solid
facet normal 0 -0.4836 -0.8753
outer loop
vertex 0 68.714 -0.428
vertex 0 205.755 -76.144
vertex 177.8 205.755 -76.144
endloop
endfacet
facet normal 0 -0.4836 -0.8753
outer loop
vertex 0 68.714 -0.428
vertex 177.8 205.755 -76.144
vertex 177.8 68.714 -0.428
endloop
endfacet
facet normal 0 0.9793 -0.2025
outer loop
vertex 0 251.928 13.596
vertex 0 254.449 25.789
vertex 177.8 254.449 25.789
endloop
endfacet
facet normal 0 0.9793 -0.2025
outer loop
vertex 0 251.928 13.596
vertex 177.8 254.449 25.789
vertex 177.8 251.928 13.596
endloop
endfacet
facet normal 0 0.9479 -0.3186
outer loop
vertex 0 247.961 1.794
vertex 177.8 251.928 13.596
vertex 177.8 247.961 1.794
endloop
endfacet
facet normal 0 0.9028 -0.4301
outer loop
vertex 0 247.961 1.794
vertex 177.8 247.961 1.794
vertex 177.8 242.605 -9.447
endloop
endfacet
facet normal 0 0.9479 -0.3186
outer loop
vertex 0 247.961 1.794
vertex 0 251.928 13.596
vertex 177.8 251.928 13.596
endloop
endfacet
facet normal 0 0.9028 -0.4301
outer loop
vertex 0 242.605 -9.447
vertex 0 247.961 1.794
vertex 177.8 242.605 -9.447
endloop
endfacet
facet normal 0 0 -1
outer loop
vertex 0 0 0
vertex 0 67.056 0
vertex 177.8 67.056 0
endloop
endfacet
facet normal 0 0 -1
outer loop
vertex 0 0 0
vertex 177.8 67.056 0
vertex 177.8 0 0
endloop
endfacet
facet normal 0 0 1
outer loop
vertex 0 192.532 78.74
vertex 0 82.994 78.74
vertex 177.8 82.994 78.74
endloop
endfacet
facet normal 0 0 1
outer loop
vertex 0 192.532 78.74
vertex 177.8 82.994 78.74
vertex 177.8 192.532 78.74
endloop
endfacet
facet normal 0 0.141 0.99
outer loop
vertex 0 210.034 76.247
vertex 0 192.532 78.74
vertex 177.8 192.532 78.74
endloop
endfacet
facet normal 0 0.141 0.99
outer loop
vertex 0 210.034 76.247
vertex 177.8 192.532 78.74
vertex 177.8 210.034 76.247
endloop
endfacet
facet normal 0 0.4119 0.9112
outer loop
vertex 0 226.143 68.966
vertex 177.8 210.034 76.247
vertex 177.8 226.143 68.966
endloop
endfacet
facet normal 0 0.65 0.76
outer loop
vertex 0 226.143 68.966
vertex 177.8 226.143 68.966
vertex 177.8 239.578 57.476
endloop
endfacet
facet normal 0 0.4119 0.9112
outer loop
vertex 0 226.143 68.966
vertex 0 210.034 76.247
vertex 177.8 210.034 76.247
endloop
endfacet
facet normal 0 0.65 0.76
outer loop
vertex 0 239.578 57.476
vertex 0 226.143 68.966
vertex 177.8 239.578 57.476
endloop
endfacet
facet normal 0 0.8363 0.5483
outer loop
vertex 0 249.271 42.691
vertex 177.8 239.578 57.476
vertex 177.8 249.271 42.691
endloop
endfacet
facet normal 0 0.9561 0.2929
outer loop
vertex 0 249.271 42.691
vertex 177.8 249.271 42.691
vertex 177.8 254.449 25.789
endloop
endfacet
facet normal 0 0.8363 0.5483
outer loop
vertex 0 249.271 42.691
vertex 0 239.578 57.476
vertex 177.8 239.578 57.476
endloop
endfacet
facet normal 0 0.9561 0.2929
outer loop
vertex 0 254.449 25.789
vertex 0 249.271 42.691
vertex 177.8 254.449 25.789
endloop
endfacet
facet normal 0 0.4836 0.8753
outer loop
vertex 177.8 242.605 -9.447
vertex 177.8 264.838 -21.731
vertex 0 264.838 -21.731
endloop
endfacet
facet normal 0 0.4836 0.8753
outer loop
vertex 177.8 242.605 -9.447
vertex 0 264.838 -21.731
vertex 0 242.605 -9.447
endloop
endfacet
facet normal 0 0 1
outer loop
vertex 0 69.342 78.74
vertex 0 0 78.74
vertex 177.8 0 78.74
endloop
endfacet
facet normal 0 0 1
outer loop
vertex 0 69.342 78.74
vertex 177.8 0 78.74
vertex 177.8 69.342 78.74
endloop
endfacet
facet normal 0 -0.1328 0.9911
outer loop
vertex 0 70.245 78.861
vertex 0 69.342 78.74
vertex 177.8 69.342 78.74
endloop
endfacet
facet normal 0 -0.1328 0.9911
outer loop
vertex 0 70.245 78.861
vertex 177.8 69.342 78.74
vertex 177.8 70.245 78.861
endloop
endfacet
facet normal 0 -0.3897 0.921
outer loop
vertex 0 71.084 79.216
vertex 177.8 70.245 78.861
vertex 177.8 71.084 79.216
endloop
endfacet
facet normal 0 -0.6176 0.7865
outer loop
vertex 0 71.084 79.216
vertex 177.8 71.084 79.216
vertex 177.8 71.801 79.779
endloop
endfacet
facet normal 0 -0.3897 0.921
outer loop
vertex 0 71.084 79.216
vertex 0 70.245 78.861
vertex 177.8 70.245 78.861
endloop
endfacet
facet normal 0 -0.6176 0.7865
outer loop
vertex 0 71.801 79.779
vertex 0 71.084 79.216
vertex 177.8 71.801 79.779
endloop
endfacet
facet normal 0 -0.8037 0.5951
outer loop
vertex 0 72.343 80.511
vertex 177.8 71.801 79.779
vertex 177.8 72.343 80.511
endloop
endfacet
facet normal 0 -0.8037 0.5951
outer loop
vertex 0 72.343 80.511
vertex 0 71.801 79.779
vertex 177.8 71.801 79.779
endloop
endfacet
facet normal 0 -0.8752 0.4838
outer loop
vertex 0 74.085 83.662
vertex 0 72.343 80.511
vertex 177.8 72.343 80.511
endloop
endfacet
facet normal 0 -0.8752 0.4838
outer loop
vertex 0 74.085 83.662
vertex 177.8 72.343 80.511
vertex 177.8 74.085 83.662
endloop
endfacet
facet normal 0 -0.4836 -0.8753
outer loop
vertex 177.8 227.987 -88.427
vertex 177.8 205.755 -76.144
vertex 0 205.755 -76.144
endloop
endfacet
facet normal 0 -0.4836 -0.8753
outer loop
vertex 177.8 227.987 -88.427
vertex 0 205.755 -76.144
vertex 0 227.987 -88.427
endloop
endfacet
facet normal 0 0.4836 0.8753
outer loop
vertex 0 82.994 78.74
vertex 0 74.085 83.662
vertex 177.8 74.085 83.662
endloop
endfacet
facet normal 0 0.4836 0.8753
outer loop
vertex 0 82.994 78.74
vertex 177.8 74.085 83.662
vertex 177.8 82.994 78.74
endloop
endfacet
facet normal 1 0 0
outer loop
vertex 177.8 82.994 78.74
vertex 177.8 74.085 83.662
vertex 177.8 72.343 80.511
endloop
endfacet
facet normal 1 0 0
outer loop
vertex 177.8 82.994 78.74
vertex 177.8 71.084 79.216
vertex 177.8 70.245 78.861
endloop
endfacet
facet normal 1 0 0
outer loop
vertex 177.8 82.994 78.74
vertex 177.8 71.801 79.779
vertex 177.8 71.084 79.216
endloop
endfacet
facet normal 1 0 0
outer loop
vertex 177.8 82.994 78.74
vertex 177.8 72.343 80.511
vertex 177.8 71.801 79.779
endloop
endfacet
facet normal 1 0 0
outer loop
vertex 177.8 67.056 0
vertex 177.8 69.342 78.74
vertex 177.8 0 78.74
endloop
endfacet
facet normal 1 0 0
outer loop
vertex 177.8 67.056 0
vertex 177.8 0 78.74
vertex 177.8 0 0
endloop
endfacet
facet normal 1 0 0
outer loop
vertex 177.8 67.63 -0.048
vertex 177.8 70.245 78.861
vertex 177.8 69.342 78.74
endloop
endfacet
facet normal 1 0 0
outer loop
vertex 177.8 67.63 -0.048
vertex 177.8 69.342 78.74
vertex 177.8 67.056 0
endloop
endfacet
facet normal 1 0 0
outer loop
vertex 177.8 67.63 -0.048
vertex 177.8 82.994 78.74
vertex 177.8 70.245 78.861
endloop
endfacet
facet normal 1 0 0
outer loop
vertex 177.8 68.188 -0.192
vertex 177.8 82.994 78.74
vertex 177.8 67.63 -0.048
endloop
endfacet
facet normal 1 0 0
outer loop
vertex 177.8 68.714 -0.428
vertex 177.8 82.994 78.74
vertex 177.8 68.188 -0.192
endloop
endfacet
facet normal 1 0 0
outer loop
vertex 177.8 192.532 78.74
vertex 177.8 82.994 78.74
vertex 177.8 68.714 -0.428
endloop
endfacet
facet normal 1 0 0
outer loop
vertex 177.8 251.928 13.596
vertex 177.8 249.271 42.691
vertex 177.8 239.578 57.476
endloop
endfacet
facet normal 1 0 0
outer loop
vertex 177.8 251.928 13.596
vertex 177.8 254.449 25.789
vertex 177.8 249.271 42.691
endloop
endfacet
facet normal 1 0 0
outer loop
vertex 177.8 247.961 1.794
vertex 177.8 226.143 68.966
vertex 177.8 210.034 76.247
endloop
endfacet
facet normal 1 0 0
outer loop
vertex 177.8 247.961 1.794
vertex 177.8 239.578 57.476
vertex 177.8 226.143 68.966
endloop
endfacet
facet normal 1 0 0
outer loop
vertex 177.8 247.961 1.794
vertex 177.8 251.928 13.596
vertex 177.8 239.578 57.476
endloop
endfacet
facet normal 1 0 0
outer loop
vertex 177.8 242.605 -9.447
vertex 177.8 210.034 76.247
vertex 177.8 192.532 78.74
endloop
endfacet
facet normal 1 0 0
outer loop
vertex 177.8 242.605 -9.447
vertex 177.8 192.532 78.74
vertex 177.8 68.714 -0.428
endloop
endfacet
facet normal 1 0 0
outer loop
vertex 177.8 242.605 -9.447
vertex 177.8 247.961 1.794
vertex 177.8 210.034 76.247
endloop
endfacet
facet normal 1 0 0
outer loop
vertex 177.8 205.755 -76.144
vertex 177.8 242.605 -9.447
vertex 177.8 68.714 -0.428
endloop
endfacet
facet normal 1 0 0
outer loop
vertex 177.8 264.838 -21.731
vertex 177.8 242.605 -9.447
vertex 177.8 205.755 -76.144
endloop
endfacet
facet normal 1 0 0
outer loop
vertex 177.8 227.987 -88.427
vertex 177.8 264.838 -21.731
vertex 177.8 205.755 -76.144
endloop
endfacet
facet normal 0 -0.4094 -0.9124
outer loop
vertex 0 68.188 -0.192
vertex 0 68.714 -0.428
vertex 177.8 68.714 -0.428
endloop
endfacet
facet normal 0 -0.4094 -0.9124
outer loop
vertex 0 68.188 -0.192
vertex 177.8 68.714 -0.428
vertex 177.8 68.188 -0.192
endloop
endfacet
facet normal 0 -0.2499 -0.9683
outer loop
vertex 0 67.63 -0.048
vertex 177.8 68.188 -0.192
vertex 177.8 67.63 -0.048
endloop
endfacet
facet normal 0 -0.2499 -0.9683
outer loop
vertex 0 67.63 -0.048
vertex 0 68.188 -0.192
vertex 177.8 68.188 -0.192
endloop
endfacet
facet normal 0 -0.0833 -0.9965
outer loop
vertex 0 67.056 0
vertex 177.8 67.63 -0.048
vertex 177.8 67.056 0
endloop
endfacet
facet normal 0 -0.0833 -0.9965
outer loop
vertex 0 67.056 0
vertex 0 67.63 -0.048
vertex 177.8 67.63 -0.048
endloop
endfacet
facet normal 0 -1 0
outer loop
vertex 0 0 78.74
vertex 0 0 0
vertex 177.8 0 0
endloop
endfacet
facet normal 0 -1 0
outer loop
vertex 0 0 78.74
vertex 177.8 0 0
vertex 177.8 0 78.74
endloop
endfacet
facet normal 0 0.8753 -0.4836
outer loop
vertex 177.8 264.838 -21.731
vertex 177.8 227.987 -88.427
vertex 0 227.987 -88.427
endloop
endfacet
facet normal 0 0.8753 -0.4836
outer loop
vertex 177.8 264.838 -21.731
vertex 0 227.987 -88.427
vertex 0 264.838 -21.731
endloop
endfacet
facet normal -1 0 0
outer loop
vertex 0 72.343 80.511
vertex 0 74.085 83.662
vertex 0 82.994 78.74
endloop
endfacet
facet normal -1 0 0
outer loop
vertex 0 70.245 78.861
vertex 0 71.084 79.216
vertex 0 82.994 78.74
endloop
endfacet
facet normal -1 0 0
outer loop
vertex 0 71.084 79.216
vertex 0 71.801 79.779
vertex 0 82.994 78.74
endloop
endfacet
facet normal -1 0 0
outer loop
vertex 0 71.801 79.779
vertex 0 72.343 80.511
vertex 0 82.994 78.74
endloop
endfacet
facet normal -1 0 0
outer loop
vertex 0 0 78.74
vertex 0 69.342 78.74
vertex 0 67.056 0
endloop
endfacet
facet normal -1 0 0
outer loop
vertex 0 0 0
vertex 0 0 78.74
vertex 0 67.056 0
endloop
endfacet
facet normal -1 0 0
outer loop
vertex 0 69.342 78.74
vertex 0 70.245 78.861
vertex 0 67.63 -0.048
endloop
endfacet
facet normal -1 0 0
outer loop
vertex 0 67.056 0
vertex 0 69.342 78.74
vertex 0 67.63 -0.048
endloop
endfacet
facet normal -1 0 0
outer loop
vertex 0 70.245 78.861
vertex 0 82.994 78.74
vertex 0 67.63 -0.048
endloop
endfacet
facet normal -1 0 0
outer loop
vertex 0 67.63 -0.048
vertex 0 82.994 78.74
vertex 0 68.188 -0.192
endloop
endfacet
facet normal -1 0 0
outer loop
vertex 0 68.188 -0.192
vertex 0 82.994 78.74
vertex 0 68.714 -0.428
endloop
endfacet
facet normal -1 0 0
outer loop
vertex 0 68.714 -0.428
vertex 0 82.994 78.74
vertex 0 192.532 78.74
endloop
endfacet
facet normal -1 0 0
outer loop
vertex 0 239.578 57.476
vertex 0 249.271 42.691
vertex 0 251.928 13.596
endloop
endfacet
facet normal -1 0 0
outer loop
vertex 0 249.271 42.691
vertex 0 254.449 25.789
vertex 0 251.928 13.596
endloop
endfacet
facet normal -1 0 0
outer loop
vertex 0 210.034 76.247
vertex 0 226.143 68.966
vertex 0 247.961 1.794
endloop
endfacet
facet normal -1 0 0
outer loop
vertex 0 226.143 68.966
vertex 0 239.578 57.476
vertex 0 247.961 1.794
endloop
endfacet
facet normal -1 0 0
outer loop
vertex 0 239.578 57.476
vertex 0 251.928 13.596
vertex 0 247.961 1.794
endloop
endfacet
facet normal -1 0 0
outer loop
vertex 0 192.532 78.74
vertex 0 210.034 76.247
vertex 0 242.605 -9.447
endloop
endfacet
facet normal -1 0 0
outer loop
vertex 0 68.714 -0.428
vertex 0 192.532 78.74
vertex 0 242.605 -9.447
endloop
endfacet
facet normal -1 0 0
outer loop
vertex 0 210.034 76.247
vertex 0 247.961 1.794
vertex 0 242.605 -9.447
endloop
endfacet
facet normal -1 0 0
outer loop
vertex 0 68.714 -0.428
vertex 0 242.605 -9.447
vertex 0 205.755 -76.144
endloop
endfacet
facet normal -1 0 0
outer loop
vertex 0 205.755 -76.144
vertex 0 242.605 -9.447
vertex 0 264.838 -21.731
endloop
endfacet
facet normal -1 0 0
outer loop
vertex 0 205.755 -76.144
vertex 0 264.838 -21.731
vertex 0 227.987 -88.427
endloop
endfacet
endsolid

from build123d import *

# Parameters (mm, degrees)
BOSS_EXTRUDE1_DEPTH = 177.8
BOSS_EXTRUDE2_DEPTH = 177.8


with BuildPart() as part:
    # Sketch2 → Boss-Extrude1 (new body)
    with BuildSketch(Plane(origin=(0, 0, 0), x_dir=(0, 0, -1), z_dir=(1, 0, 0))):
        with BuildLine():
            Line((9.446959598, 242.605367243), (76.143806671, 205.754714731))
            Line((76.143806671, 205.754714731), (0.427641882, 68.714279363))
            ThreePointArc((0.427641882, 68.714279363), (0.108631196, 67.912266317), (0, 67.056))
            Line((0, 67.056), (0, 0))
            Line((0, 0), (-78.74, 0))
            Line((-78.74, 0), (-78.74, 69.342))
            ThreePointArc((-78.74, 69.342), (-79.215672983, 71.084383578), (-80.510720637, 72.343358118))
            Line((-80.510720637, 72.343358118), (-83.662355749, 74.084666973))
            Line((-83.662355749, 74.084666973), (-78.74, 82.993752329))
            Line((-78.74, 82.993752329), (-78.74, 192.532))
            ThreePointArc((-78.74, 192.532), (-63.696886188, 233.267747455), (-25.788612916, 254.449324625))
            ThreePointArc((-25.788612916, 254.449324625), (-7.634921788, 250.121653844), (9.446959598, 242.605367243))
        make_face()
    extrude(amount=BOSS_EXTRUDE1_DEPTH)

    # Sketch3 → Boss-Extrude2 (add)
    with BuildSketch(Plane(origin=(177.8, 0, 0), x_dir=(0, 0, -1), z_dir=(1, 0, 0))):
        Polygon((76.143806671, 205.754714731), (88.427357508, 227.986997088), (21.730510436, 264.8376496), (9.446959598, 242.605367243), align=None)
    extrude(amount=-BOSS_EXTRUDE2_DEPTH)


solid = part.part
